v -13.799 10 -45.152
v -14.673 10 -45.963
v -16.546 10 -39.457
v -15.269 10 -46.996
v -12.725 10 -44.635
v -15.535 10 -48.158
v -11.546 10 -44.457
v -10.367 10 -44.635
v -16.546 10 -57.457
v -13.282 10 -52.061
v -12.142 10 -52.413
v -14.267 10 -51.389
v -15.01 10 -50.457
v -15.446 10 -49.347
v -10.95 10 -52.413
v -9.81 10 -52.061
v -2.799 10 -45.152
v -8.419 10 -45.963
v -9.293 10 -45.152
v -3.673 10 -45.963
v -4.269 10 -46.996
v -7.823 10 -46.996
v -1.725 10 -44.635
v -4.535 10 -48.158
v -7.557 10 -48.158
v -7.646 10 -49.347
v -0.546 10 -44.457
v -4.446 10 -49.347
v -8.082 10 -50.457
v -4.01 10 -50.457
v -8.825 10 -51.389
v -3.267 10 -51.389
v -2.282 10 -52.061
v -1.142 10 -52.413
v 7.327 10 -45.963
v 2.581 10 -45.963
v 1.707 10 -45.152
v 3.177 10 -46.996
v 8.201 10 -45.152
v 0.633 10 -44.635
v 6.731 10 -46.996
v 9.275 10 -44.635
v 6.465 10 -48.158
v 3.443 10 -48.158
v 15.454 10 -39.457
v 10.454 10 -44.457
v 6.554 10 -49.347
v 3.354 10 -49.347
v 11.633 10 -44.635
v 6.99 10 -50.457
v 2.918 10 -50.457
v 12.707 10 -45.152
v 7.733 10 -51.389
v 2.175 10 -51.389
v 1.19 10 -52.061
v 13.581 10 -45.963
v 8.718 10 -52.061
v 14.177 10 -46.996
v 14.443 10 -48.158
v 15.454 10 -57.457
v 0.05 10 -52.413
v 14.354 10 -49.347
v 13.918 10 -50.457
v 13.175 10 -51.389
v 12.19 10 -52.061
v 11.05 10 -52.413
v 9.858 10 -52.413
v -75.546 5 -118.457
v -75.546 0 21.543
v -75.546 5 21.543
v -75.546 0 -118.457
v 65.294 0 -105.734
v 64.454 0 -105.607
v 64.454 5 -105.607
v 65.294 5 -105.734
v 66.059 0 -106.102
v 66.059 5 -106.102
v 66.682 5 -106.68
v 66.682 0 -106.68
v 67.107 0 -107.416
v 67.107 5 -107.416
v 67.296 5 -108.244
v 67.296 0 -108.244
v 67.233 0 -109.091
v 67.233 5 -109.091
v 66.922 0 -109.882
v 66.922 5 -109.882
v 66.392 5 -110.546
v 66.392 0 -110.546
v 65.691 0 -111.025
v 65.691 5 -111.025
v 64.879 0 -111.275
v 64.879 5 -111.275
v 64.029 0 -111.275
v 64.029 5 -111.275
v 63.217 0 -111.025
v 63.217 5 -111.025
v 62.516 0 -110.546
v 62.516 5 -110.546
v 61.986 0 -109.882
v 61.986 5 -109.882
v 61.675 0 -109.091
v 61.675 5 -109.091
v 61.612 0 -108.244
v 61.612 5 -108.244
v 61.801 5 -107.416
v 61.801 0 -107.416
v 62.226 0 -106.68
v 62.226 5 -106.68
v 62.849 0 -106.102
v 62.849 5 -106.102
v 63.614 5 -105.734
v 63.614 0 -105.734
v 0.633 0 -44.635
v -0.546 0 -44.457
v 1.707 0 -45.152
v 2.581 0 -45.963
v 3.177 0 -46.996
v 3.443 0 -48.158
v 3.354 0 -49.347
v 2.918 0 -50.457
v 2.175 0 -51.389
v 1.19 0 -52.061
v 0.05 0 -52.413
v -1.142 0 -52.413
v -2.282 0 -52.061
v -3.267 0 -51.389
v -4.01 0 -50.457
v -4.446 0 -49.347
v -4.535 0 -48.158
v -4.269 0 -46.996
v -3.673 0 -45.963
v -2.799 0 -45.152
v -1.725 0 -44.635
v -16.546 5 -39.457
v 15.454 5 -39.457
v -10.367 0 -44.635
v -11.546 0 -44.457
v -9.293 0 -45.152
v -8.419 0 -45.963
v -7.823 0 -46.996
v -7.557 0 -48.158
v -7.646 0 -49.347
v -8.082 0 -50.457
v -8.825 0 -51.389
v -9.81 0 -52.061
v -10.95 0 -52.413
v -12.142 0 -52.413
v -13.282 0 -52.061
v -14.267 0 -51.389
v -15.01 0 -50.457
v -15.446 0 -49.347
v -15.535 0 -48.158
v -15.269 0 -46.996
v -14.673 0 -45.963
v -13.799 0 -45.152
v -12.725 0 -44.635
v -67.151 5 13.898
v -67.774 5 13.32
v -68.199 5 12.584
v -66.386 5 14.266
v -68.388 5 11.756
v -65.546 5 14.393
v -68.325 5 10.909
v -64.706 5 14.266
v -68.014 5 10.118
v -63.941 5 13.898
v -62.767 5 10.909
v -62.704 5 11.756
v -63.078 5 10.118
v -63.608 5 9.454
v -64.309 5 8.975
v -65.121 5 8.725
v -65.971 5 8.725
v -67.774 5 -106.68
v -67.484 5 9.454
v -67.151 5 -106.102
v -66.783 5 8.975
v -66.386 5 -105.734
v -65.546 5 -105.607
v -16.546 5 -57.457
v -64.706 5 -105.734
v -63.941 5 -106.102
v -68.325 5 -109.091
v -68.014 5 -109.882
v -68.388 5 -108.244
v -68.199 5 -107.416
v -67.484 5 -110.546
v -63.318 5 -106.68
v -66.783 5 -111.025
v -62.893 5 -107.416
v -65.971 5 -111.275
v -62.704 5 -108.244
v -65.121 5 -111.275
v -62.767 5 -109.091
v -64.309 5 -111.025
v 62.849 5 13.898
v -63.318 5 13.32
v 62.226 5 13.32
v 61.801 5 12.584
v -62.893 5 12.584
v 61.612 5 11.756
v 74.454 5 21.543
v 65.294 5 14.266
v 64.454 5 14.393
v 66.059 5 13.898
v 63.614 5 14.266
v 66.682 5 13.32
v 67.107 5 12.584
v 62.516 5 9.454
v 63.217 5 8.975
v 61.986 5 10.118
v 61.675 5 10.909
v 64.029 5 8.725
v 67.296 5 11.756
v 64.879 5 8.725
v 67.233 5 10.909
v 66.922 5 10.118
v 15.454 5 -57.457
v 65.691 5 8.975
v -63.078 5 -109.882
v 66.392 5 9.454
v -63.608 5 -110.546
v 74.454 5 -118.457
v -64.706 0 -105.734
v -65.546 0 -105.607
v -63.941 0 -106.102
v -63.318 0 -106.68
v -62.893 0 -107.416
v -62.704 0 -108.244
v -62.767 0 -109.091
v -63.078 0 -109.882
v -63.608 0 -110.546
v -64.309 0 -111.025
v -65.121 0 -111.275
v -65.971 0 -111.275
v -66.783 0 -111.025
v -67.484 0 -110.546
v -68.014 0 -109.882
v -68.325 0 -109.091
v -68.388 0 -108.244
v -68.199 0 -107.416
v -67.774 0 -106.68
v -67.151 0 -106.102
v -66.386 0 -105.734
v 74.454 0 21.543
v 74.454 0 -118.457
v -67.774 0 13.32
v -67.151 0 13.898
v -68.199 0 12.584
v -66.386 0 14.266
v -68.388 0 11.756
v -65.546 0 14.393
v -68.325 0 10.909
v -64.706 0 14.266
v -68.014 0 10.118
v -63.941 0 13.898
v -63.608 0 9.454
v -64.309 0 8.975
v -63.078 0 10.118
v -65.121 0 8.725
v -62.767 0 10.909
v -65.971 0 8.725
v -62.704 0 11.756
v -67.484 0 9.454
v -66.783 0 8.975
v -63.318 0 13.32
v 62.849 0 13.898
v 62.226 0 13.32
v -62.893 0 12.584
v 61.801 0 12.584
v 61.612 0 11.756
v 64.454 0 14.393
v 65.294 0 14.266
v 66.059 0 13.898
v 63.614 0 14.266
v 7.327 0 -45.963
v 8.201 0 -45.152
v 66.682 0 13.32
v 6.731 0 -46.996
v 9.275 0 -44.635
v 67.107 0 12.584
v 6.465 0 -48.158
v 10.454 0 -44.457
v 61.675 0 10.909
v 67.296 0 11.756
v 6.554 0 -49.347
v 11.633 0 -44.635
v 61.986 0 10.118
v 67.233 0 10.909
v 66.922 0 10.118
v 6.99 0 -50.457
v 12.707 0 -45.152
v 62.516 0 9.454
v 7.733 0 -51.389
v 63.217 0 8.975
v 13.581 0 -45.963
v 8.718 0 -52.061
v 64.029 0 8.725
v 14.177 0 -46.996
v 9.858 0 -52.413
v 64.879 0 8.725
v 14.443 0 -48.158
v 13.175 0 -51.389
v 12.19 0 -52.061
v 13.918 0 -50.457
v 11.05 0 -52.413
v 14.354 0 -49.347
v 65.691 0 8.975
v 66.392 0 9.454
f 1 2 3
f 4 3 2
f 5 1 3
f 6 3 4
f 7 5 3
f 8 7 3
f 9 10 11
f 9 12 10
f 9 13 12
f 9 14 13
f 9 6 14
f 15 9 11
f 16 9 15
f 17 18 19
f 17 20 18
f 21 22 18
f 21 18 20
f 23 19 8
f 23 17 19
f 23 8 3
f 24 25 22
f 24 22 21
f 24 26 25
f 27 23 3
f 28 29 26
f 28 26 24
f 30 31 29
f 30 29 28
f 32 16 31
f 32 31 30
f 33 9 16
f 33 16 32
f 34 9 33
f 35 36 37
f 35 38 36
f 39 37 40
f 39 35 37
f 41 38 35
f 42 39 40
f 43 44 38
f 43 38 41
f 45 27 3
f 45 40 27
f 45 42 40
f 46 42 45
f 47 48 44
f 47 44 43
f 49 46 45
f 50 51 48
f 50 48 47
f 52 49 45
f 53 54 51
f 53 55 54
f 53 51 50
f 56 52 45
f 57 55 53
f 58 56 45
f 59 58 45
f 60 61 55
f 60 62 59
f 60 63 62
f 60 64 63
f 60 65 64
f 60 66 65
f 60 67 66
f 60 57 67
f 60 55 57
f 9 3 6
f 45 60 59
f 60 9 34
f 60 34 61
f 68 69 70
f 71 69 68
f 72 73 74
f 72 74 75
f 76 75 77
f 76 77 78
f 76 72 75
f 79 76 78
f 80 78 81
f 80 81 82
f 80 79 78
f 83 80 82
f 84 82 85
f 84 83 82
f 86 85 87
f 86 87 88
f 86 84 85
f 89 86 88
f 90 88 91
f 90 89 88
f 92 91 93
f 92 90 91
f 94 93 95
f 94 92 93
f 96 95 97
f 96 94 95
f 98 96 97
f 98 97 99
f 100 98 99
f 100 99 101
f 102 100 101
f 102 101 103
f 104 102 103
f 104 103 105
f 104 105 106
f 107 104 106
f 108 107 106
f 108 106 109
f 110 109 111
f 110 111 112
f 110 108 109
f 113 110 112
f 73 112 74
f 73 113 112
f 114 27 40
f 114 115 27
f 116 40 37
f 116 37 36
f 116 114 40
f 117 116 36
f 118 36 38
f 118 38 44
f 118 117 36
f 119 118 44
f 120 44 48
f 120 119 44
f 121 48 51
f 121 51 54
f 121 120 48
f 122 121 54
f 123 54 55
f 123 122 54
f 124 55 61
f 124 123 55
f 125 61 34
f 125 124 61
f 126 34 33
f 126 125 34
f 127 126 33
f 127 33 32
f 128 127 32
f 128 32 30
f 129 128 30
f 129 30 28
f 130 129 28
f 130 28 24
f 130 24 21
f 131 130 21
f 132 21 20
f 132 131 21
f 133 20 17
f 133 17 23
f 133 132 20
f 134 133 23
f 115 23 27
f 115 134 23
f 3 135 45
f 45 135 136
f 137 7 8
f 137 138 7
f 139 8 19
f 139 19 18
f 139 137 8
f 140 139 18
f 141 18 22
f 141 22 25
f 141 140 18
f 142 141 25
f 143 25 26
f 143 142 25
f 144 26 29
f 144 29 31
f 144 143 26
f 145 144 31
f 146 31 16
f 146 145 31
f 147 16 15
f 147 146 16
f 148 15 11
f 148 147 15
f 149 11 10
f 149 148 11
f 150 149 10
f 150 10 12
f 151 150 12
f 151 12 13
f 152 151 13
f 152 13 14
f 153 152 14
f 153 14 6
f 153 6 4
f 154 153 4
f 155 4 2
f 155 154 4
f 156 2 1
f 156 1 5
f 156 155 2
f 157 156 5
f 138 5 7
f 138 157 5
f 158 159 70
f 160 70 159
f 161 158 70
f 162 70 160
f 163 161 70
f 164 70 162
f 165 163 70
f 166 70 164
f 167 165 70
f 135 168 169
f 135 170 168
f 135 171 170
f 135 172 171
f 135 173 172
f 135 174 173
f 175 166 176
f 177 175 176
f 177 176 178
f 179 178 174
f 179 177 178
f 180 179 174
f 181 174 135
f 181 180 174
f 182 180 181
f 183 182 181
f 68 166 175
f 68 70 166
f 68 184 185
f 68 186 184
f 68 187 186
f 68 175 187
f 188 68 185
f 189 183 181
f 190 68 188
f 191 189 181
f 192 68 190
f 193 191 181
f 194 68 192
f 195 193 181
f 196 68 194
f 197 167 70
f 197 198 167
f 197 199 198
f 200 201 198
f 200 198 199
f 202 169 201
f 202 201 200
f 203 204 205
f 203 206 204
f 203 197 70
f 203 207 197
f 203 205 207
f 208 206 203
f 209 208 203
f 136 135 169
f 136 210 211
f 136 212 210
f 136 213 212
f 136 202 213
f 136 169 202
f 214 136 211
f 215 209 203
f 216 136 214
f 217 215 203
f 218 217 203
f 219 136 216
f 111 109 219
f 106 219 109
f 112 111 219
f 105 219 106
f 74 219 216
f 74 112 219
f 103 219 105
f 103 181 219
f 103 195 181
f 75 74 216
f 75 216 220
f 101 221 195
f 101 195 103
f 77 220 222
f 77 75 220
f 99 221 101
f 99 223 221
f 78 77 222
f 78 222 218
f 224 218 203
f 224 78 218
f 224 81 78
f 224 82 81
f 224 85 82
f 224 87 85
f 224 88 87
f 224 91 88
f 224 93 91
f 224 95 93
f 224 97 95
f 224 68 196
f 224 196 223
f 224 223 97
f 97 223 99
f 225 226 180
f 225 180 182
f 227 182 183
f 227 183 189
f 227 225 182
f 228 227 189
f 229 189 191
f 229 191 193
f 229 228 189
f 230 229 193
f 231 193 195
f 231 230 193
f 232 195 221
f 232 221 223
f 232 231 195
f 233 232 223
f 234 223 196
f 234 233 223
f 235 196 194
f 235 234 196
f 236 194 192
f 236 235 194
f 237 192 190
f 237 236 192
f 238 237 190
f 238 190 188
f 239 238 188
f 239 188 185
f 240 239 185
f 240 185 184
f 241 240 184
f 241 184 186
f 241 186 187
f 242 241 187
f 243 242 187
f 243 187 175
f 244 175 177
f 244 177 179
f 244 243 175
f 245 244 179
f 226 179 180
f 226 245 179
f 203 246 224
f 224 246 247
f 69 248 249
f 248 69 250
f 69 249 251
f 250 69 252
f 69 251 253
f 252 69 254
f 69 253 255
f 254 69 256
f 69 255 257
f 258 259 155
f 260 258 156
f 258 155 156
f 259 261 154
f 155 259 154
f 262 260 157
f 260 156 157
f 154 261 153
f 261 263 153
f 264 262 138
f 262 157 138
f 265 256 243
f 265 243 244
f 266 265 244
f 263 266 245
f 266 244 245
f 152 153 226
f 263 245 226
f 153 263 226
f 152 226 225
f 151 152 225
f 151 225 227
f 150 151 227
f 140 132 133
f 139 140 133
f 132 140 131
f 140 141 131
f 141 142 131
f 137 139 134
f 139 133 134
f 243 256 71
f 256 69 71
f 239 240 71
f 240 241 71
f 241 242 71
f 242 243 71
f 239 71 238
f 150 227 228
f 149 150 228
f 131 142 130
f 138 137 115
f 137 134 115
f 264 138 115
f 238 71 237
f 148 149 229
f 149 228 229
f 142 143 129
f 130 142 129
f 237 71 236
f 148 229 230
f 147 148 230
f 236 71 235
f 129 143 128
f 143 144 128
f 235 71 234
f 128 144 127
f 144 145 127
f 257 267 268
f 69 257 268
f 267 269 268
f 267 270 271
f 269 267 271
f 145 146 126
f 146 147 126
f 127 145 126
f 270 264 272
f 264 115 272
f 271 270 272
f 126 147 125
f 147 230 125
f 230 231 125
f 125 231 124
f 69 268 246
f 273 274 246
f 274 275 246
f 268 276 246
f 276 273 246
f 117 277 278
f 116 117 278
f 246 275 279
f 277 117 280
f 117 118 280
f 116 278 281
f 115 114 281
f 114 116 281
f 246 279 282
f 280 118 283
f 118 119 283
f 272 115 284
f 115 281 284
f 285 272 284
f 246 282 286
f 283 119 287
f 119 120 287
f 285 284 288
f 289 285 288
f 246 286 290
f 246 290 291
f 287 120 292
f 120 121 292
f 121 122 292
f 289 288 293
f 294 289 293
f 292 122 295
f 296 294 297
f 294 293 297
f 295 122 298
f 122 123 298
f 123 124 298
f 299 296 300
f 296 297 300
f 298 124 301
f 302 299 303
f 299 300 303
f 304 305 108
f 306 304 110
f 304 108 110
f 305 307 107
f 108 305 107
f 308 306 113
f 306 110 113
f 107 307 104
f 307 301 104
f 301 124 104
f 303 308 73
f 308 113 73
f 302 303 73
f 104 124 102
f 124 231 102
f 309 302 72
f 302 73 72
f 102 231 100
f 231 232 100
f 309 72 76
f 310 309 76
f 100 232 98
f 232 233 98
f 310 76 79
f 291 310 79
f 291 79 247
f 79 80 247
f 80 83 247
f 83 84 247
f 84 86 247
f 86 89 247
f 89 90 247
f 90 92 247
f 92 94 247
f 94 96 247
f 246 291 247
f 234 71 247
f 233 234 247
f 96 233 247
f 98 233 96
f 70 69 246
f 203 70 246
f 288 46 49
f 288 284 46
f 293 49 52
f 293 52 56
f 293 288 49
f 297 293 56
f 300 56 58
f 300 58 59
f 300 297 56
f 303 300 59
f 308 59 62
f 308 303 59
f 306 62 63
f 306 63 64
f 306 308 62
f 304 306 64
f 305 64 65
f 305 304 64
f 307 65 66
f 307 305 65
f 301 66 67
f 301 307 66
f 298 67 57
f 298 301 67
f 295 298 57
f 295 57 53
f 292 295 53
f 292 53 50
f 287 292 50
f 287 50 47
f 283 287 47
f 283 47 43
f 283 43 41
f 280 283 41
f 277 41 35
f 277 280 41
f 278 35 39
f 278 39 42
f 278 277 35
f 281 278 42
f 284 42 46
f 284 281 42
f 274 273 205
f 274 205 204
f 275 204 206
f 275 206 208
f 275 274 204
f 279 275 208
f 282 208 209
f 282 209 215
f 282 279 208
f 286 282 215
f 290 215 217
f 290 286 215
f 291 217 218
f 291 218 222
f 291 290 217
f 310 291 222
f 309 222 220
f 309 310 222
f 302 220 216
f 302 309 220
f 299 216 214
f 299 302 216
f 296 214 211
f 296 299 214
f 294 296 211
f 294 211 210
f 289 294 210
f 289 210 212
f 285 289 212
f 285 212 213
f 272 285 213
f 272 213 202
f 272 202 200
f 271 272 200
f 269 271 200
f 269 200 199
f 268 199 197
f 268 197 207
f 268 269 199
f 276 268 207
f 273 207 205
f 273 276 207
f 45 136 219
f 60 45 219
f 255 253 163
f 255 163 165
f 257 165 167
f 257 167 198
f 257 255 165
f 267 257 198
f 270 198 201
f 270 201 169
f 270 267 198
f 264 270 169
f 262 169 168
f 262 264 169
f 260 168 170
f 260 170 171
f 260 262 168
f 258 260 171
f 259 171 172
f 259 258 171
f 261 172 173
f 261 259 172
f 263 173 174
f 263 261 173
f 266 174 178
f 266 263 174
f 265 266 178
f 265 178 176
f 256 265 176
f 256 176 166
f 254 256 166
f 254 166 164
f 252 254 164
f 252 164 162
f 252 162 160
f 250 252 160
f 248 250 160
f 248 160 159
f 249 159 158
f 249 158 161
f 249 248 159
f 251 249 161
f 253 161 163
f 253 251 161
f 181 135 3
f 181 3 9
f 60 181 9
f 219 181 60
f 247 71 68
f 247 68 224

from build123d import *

# Parameters (mm, degrees)
SKETCH1_W           = 150
SKETCH1_H           = 140
SKETCH1_R           = 2.85
SKETCH1_R_2         = 4
BOSS_EXTRUDE1_DEPTH = 5
SKETCH2_W           = 32
SKETCH2_H           = 18
SKETCH2_R           = 4
BOSS_EXTRUDE2_DEPTH = 5


with BuildPart() as part:
    # Sketch1 → Boss-Extrude1 (new body)
    with BuildSketch(Plane(origin=(0, 0, 0), x_dir=(1, 0, 0), z_dir=(0, 1, 0))):
        with Locations((-0.545997502, 48.457242913)):
            Rectangle(SKETCH1_W, SKETCH1_H)
        with Locations(Location((-65.545997502, 108.457242913, 0), (0, 0, 270))):
            Circle(SKETCH1_R, mode=Mode.SUBTRACT)
        with Locations(Location((64.454002498, 108.457242913, 0), (0, 0, 270))):
            Circle(SKETCH1_R, mode=Mode.SUBTRACT)
        with Locations(Location((64.454002498, -11.542757087, 0), (0, 0, 270))):
            Circle(SKETCH1_R, mode=Mode.SUBTRACT)
        with Locations(Location((-65.545997502, -11.542757087, 0), (0, 0, 270))):
            Circle(SKETCH1_R, mode=Mode.SUBTRACT)
        with Locations(Location((-11.545997502, 48.457242913, 0), (0, 0, 270))):
            Circle(SKETCH1_R_2, mode=Mode.SUBTRACT)
        with Locations(Location((-0.545997502, 48.457242913, 0), (0, 0, 270))):
            Circle(SKETCH1_R_2, mode=Mode.SUBTRACT)
        with Locations(Location((10.454002498, 48.457242913, 0), (0, 0, 270))):
            Circle(SKETCH1_R_2, mode=Mode.SUBTRACT)
    extrude(amount=BOSS_EXTRUDE1_DEPTH)

    # Sketch2 → Boss-Extrude2 (add)
    with BuildSketch(Plane(origin=(0, 5, 0), x_dir=(1, 0, 0), z_dir=(0, 1, 0))):
        with Locations((-0.545997502, 48.457242913)):
            Rectangle(SKETCH2_W, SKETCH2_H)
        with Locations(Location((-0.545997502, 48.457242913, 0), (0, 0, 270))):
            Circle(SKETCH2_R, mode=Mode.SUBTRACT)
        with Locations(Location((10.454002498, 48.457242913, 0), (0, 0, 270))):
            Circle(SKETCH2_R, mode=Mode.SUBTRACT)
        with Locations(Location((-11.545997502, 48.457242913, 0), (0, 0, 270))):
            Circle(SKETCH2_R, mode=Mode.SUBTRACT)
    extrude(amount=BOSS_EXTRUDE2_DEPTH)


solid = part.part
